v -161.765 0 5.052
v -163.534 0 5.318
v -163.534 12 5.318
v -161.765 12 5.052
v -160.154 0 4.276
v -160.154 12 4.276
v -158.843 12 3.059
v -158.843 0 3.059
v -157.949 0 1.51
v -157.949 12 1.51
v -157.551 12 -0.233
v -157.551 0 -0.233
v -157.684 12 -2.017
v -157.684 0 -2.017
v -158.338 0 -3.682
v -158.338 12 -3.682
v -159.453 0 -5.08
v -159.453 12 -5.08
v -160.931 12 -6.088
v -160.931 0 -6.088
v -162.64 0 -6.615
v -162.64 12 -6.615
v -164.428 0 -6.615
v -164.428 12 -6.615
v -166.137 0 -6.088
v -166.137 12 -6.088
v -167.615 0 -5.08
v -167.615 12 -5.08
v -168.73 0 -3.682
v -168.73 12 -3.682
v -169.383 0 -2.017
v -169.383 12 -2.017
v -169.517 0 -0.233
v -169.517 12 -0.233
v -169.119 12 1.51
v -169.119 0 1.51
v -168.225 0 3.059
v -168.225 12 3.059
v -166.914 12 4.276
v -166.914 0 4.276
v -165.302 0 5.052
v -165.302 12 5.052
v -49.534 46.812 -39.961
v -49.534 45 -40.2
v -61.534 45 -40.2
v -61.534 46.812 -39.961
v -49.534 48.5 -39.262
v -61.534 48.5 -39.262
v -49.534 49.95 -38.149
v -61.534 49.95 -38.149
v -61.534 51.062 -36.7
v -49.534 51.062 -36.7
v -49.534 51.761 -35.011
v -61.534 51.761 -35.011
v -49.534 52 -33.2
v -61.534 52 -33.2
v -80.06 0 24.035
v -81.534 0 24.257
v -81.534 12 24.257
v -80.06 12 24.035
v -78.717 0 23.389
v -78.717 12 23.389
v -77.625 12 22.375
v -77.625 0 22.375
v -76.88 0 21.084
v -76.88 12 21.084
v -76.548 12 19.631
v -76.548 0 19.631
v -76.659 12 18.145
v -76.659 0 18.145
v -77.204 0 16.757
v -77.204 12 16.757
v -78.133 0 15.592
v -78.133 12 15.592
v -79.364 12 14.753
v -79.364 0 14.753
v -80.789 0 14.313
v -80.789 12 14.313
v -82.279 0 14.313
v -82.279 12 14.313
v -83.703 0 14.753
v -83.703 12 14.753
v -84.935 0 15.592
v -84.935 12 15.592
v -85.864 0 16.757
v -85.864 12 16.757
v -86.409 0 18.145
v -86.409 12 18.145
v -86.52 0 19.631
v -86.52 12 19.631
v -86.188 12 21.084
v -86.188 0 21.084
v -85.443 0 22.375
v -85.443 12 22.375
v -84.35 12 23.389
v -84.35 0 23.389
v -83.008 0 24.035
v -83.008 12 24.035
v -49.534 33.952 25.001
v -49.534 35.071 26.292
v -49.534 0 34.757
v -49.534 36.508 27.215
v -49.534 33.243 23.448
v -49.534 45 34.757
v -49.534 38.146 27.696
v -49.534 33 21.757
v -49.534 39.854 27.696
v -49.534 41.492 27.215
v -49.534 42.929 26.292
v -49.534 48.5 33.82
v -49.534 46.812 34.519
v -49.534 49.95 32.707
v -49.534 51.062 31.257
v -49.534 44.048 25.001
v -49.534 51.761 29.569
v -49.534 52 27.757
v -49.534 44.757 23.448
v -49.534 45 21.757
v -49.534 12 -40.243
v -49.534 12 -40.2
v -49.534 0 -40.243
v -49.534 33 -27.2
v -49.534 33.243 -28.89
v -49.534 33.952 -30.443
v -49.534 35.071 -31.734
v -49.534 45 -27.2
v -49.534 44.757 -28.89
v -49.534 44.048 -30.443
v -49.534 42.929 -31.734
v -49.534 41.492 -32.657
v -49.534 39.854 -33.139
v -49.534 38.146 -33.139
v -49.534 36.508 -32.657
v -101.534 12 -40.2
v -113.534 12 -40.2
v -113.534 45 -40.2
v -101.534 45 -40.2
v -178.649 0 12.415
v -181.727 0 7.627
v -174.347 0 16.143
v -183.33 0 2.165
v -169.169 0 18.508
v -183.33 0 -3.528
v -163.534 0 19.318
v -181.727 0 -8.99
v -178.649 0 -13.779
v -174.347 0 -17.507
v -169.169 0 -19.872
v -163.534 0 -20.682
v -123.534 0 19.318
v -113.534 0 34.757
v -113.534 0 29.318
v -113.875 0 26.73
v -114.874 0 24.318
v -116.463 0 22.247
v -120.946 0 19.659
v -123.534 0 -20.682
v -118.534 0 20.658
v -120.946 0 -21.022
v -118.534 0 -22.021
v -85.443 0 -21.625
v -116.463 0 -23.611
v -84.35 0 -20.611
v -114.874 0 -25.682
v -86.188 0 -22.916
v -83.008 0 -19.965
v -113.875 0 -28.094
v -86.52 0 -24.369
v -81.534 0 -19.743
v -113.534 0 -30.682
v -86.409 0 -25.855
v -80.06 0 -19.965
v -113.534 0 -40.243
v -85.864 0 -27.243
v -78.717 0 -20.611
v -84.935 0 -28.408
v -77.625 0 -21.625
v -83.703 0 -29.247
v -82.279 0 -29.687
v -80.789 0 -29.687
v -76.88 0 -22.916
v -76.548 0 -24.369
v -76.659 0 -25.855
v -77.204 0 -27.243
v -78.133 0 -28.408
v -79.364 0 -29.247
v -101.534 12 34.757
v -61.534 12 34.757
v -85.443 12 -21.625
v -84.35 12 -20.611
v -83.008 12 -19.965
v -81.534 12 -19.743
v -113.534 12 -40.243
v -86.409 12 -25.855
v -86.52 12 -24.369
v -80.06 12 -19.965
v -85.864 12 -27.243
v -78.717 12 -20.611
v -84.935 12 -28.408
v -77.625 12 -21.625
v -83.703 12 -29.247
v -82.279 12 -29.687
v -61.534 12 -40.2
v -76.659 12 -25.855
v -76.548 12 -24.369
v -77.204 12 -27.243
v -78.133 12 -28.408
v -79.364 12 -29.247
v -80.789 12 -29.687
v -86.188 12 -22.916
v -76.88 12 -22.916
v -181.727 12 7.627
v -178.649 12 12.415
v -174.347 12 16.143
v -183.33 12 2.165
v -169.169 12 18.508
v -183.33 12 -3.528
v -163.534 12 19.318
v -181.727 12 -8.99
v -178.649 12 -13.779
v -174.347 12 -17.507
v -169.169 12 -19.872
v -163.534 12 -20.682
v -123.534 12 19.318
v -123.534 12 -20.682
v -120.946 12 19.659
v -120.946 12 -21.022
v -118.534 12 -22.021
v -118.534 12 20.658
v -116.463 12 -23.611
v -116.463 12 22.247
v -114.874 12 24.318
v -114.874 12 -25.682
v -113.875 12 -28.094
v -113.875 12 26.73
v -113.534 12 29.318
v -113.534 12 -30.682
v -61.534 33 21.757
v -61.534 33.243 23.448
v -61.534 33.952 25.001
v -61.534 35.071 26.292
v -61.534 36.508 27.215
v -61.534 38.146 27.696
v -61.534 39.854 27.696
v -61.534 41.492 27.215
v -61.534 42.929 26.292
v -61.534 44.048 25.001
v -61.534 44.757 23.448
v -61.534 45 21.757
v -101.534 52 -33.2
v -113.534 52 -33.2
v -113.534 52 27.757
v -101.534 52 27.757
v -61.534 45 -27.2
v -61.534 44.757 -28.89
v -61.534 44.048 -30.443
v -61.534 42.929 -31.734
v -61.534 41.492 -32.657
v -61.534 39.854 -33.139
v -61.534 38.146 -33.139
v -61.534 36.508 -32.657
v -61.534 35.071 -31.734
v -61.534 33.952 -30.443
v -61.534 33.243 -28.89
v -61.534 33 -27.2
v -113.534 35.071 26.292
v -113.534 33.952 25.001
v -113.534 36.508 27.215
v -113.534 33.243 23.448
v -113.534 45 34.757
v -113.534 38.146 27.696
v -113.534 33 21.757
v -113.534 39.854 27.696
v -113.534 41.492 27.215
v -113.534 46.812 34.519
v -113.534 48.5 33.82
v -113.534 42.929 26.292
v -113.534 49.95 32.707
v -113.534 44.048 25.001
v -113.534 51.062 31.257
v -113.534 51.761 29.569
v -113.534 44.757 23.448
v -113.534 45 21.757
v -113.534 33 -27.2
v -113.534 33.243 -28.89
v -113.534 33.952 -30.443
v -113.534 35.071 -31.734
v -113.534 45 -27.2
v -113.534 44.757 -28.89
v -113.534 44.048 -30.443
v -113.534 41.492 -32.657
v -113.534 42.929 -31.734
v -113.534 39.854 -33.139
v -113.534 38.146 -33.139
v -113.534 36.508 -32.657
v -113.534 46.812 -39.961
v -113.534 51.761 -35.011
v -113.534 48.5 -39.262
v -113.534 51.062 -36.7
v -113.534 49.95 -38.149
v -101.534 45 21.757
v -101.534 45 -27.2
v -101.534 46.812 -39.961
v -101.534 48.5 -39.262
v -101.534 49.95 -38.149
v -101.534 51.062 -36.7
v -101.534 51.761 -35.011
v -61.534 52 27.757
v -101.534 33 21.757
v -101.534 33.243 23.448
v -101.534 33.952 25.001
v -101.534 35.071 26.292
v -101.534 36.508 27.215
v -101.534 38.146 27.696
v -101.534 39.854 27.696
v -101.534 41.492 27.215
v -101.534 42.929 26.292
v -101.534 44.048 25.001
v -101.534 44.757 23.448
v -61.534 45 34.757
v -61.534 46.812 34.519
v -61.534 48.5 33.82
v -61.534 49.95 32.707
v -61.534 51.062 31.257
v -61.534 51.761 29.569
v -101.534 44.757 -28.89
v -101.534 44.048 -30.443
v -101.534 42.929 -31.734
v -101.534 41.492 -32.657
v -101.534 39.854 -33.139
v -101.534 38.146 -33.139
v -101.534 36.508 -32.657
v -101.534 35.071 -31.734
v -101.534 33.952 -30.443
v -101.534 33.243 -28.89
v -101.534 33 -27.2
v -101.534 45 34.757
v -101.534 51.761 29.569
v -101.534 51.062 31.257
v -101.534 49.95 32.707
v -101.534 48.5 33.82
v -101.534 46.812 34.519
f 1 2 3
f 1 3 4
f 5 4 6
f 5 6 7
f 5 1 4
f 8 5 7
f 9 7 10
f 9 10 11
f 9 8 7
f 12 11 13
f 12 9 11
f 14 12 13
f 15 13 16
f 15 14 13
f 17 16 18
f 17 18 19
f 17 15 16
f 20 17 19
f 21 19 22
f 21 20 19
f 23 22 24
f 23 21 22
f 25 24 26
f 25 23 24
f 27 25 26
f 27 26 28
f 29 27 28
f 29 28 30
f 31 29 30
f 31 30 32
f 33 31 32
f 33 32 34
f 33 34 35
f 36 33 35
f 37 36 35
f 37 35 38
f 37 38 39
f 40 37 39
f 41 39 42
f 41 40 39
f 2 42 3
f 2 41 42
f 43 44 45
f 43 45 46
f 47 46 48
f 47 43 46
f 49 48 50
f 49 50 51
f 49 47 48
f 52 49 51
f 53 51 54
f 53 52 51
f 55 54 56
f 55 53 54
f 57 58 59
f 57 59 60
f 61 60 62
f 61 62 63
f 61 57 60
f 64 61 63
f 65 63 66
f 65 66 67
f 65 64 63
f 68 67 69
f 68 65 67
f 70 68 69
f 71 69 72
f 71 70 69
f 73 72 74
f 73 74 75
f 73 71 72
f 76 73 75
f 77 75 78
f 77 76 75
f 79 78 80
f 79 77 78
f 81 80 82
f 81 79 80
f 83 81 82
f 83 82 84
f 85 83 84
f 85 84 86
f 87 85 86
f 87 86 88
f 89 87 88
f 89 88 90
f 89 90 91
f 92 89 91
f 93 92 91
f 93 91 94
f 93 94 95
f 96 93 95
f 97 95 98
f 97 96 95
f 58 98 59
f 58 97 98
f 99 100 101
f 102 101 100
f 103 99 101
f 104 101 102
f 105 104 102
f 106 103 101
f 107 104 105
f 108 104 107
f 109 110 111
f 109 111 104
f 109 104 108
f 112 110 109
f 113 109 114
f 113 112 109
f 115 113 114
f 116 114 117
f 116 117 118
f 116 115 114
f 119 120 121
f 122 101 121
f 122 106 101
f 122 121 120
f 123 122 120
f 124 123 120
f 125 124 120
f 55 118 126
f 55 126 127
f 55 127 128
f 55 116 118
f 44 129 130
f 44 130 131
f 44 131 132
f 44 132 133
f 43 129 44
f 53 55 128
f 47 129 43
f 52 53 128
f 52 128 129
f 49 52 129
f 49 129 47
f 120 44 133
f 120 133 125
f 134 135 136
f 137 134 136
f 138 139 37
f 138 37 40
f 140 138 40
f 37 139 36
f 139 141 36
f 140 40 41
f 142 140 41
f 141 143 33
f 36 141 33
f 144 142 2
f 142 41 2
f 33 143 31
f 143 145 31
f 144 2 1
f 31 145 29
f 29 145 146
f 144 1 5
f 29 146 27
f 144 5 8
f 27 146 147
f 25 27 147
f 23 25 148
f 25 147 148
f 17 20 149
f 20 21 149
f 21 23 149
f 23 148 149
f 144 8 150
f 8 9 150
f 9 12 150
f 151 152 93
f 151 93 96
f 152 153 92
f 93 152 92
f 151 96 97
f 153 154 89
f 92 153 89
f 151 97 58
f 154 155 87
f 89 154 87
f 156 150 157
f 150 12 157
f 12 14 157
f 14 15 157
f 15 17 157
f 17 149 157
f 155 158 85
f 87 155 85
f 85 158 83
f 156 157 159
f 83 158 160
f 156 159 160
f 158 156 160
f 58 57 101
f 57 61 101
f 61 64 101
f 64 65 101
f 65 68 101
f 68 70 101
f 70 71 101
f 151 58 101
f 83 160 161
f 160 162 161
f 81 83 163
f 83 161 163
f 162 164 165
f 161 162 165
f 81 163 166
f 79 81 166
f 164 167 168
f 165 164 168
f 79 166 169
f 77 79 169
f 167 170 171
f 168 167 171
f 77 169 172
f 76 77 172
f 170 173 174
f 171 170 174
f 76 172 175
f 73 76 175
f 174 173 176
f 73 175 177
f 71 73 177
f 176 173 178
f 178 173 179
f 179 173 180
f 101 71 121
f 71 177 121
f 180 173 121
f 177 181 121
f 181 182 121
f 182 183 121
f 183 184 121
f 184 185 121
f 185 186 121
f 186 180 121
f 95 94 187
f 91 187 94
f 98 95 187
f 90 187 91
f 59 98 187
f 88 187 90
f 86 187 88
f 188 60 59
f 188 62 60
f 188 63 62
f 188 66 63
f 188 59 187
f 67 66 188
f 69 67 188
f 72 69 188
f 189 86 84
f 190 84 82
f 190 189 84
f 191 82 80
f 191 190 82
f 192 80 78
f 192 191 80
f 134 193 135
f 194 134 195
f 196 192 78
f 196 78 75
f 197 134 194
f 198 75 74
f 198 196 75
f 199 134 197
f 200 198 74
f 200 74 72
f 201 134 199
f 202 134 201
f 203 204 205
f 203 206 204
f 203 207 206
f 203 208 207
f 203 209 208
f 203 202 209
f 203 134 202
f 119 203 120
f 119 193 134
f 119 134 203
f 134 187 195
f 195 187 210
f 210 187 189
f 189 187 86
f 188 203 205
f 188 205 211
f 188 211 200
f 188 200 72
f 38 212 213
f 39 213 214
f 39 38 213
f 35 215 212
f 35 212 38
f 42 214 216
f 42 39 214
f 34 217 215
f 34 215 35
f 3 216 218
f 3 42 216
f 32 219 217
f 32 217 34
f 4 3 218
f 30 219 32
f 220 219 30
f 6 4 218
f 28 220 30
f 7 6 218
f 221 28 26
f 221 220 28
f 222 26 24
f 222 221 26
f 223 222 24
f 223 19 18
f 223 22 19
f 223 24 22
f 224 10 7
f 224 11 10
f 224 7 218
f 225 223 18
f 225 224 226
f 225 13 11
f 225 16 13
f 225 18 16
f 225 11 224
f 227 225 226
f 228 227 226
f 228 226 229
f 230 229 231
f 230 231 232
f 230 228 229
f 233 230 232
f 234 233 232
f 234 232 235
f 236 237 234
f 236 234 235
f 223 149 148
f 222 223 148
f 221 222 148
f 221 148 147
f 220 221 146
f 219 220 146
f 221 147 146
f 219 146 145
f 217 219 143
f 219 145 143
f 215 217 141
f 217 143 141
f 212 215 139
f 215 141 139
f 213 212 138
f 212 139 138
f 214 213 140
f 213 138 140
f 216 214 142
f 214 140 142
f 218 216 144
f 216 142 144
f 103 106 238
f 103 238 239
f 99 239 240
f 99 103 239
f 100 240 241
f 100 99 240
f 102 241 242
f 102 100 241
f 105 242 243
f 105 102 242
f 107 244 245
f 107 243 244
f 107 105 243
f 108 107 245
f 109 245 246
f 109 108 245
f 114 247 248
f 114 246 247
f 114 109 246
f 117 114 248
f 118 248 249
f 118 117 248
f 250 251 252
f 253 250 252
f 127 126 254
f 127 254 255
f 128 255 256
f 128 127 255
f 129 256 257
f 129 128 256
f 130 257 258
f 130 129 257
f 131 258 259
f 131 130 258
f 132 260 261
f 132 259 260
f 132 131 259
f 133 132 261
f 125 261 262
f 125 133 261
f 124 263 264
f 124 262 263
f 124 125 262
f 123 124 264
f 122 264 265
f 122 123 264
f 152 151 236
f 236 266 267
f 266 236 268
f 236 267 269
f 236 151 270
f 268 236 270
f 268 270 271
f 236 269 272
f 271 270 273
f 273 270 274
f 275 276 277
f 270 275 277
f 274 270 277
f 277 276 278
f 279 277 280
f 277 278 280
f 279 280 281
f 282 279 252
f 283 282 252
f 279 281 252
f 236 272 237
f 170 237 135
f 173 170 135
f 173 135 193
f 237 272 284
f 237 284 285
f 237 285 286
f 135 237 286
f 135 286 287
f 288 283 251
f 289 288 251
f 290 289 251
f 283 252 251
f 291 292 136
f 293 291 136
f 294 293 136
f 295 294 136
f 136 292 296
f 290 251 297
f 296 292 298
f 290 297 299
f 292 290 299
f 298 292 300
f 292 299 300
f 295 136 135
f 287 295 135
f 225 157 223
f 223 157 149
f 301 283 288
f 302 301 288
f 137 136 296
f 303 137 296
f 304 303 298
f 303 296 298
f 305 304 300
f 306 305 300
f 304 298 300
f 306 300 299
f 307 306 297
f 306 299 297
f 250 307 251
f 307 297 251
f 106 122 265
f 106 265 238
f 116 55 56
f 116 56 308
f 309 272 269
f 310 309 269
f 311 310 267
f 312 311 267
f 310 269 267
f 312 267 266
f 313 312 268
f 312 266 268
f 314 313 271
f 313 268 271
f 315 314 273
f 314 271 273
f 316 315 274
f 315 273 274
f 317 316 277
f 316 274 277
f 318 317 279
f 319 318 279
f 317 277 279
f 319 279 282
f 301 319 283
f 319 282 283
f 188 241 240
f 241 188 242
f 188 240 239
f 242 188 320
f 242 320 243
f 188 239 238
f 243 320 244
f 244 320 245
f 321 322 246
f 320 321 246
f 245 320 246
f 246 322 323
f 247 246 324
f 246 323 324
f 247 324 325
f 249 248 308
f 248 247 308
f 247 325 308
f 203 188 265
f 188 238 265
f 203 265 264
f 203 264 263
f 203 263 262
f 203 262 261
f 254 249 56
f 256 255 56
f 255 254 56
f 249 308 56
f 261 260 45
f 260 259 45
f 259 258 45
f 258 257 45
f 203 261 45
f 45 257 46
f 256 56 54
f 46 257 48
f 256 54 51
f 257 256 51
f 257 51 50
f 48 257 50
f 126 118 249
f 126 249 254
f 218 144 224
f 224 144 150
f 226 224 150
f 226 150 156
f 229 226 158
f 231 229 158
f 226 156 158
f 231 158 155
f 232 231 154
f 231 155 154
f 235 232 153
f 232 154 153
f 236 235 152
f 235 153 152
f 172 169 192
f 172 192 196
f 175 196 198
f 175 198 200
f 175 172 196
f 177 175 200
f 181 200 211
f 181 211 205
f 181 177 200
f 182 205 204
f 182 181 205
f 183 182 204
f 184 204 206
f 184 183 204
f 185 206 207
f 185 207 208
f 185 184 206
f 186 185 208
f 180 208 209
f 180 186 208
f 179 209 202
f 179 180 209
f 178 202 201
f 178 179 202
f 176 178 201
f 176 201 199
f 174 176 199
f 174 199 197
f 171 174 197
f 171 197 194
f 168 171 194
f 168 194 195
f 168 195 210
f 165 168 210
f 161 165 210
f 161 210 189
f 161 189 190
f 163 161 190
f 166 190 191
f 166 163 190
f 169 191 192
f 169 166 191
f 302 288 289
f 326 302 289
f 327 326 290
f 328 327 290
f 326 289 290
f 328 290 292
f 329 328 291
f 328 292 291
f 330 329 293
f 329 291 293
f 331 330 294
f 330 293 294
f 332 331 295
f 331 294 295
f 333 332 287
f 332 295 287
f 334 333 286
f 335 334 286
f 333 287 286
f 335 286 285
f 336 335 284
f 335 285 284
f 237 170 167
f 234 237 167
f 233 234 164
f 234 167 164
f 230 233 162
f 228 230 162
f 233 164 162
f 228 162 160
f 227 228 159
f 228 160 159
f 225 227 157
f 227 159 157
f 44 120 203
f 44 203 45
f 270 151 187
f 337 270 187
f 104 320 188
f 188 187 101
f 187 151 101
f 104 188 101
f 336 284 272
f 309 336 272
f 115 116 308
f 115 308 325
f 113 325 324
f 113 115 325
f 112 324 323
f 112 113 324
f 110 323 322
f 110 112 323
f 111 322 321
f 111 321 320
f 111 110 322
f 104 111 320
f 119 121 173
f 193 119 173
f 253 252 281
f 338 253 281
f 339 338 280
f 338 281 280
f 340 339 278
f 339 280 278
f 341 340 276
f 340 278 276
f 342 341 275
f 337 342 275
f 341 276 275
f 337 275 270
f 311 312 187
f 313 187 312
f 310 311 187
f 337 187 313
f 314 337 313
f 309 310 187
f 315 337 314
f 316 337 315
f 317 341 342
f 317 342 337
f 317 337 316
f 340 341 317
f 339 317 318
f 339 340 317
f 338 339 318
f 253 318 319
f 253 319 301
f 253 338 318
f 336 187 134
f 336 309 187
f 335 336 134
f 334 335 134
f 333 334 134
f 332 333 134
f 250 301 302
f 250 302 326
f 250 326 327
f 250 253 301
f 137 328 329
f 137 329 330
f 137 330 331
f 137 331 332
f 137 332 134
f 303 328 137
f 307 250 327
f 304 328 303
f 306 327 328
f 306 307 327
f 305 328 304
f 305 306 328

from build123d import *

# Parameters (mm, degrees)
SKETCH1_R           = 6
SKETCH1_R_2         = 5
BOSS_EXTRUDE1_DEPTH = 12
BOSS_EXTRUDE2_DEPTH = 12
CUT_EXTRUDE1_DEPTH  = 150.263087319


with BuildPart() as part:
    # Sketch1 → Boss-Extrude1 (new body)
    with BuildSketch(Plane(origin=(0, 0, 0), x_dir=(1, 0, 0), z_dir=(0, 1, 0))):
        with BuildLine():
            Line((-49.533874762, 40.242629587), (-113.533874762, 40.242629587))
            Line((-113.533874762, 40.242629587), (-113.533874762, 30.681729378))
            ThreePointArc((-113.533874762, 30.681729378), (-116.46280695, 23.610661566), (-123.533874762, 20.681729378))
            Line((-123.533874762, 20.681729378), (-163.533874762, 20.681729378))
            ThreePointArc((-163.533874762, 20.681729378), (-183.533874762, 0.681729378), (-163.533874762, -19.318270622))
            Line((-163.533874762, -19.318270622), (-123.533874762, -19.318270622))
            ThreePointArc((-123.533874762, -19.318270622), (-116.46280695, -22.24720281), (-113.533874762, -29.318270622))
            Line((-113.533874762, -29.318270622), (-113.533874762, -34.757370413))
            Line((-113.533874762, -34.757370413), (-49.533874762, -34.757370413))
            Line((-49.533874762, -34.757370413), (-49.533874762, 40.242629587))
        make_face()
        with Locations((-163.533874762, 0.681729378)):
            Circle(SKETCH1_R, mode=Mode.SUBTRACT)
        with Locations((-81.533874762, -19.257370413)):
            Circle(SKETCH1_R_2, mode=Mode.SUBTRACT)
        with Locations((-81.533874762, 24.742629587)):
            Circle(SKETCH1_R_2, mode=Mode.SUBTRACT)
    extrude(amount=BOSS_EXTRUDE1_DEPTH)

    # Sketch3 → Boss-Extrude2 (add)
    with BuildSketch(Plane(origin=(-49.533874762, 0, 0), x_dir=(0, 0, -1), z_dir=(1, 0, 0))):
        with BuildLine():
            Line((-34.757370413, 12), (40.199591679, 12))
            Line((40.199591679, 12), (40.199591679, 45))
            ThreePointArc((40.199591679, 45), (38.149339148, 49.949747468), (33.199591679, 52))
            Line((33.199591679, 52), (-27.757370413, 52))
            ThreePointArc((-27.757370413, 52), (-32.707117881, 49.949747468), (-34.757370413, 45))
            Line((-34.757370413, 45), (-34.757370413, 12))
        make_face()
    boss_extrude2 = extrude(amount=-BOSS_EXTRUDE2_DEPTH)

    # Sketch5 → Cut-Extrude1 (cut, through all)
    with BuildSketch(Plane(origin=(-49.533874762, 0, 0), x_dir=(0, 0, -1), z_dir=(1, 0, 0))):
        with BuildLine():
            Line((-21.757370413, 45), (27.199591679, 45))
            ThreePointArc((27.199591679, 45), (33.199591679, 39), (27.199591679, 33))
            Line((27.199591679, 33), (-21.757370413, 33))
            ThreePointArc((-21.757370413, 33), (-27.757370413, 39), (-21.757370413, 45))
        make_face()
    cut_extrude1 = extrude(amount=-CUT_EXTRUDE1_DEPTH, mode=Mode.SUBTRACT)

    # Mirror1: Boss-Extrude2, Cut-Extrude1 across plane
    add(boss_extrude2.mirror(Plane(origin=(-81.533874762, 0, 0), x_dir=(0, 0, 1), z_dir=(1, 0, 0))))
    add(cut_extrude1.mirror(Plane(origin=(-81.533874762, 0, 0), x_dir=(0, 0, 1), z_dir=(1, 0, 0))), mode=Mode.SUBTRACT)


solid = part.part
